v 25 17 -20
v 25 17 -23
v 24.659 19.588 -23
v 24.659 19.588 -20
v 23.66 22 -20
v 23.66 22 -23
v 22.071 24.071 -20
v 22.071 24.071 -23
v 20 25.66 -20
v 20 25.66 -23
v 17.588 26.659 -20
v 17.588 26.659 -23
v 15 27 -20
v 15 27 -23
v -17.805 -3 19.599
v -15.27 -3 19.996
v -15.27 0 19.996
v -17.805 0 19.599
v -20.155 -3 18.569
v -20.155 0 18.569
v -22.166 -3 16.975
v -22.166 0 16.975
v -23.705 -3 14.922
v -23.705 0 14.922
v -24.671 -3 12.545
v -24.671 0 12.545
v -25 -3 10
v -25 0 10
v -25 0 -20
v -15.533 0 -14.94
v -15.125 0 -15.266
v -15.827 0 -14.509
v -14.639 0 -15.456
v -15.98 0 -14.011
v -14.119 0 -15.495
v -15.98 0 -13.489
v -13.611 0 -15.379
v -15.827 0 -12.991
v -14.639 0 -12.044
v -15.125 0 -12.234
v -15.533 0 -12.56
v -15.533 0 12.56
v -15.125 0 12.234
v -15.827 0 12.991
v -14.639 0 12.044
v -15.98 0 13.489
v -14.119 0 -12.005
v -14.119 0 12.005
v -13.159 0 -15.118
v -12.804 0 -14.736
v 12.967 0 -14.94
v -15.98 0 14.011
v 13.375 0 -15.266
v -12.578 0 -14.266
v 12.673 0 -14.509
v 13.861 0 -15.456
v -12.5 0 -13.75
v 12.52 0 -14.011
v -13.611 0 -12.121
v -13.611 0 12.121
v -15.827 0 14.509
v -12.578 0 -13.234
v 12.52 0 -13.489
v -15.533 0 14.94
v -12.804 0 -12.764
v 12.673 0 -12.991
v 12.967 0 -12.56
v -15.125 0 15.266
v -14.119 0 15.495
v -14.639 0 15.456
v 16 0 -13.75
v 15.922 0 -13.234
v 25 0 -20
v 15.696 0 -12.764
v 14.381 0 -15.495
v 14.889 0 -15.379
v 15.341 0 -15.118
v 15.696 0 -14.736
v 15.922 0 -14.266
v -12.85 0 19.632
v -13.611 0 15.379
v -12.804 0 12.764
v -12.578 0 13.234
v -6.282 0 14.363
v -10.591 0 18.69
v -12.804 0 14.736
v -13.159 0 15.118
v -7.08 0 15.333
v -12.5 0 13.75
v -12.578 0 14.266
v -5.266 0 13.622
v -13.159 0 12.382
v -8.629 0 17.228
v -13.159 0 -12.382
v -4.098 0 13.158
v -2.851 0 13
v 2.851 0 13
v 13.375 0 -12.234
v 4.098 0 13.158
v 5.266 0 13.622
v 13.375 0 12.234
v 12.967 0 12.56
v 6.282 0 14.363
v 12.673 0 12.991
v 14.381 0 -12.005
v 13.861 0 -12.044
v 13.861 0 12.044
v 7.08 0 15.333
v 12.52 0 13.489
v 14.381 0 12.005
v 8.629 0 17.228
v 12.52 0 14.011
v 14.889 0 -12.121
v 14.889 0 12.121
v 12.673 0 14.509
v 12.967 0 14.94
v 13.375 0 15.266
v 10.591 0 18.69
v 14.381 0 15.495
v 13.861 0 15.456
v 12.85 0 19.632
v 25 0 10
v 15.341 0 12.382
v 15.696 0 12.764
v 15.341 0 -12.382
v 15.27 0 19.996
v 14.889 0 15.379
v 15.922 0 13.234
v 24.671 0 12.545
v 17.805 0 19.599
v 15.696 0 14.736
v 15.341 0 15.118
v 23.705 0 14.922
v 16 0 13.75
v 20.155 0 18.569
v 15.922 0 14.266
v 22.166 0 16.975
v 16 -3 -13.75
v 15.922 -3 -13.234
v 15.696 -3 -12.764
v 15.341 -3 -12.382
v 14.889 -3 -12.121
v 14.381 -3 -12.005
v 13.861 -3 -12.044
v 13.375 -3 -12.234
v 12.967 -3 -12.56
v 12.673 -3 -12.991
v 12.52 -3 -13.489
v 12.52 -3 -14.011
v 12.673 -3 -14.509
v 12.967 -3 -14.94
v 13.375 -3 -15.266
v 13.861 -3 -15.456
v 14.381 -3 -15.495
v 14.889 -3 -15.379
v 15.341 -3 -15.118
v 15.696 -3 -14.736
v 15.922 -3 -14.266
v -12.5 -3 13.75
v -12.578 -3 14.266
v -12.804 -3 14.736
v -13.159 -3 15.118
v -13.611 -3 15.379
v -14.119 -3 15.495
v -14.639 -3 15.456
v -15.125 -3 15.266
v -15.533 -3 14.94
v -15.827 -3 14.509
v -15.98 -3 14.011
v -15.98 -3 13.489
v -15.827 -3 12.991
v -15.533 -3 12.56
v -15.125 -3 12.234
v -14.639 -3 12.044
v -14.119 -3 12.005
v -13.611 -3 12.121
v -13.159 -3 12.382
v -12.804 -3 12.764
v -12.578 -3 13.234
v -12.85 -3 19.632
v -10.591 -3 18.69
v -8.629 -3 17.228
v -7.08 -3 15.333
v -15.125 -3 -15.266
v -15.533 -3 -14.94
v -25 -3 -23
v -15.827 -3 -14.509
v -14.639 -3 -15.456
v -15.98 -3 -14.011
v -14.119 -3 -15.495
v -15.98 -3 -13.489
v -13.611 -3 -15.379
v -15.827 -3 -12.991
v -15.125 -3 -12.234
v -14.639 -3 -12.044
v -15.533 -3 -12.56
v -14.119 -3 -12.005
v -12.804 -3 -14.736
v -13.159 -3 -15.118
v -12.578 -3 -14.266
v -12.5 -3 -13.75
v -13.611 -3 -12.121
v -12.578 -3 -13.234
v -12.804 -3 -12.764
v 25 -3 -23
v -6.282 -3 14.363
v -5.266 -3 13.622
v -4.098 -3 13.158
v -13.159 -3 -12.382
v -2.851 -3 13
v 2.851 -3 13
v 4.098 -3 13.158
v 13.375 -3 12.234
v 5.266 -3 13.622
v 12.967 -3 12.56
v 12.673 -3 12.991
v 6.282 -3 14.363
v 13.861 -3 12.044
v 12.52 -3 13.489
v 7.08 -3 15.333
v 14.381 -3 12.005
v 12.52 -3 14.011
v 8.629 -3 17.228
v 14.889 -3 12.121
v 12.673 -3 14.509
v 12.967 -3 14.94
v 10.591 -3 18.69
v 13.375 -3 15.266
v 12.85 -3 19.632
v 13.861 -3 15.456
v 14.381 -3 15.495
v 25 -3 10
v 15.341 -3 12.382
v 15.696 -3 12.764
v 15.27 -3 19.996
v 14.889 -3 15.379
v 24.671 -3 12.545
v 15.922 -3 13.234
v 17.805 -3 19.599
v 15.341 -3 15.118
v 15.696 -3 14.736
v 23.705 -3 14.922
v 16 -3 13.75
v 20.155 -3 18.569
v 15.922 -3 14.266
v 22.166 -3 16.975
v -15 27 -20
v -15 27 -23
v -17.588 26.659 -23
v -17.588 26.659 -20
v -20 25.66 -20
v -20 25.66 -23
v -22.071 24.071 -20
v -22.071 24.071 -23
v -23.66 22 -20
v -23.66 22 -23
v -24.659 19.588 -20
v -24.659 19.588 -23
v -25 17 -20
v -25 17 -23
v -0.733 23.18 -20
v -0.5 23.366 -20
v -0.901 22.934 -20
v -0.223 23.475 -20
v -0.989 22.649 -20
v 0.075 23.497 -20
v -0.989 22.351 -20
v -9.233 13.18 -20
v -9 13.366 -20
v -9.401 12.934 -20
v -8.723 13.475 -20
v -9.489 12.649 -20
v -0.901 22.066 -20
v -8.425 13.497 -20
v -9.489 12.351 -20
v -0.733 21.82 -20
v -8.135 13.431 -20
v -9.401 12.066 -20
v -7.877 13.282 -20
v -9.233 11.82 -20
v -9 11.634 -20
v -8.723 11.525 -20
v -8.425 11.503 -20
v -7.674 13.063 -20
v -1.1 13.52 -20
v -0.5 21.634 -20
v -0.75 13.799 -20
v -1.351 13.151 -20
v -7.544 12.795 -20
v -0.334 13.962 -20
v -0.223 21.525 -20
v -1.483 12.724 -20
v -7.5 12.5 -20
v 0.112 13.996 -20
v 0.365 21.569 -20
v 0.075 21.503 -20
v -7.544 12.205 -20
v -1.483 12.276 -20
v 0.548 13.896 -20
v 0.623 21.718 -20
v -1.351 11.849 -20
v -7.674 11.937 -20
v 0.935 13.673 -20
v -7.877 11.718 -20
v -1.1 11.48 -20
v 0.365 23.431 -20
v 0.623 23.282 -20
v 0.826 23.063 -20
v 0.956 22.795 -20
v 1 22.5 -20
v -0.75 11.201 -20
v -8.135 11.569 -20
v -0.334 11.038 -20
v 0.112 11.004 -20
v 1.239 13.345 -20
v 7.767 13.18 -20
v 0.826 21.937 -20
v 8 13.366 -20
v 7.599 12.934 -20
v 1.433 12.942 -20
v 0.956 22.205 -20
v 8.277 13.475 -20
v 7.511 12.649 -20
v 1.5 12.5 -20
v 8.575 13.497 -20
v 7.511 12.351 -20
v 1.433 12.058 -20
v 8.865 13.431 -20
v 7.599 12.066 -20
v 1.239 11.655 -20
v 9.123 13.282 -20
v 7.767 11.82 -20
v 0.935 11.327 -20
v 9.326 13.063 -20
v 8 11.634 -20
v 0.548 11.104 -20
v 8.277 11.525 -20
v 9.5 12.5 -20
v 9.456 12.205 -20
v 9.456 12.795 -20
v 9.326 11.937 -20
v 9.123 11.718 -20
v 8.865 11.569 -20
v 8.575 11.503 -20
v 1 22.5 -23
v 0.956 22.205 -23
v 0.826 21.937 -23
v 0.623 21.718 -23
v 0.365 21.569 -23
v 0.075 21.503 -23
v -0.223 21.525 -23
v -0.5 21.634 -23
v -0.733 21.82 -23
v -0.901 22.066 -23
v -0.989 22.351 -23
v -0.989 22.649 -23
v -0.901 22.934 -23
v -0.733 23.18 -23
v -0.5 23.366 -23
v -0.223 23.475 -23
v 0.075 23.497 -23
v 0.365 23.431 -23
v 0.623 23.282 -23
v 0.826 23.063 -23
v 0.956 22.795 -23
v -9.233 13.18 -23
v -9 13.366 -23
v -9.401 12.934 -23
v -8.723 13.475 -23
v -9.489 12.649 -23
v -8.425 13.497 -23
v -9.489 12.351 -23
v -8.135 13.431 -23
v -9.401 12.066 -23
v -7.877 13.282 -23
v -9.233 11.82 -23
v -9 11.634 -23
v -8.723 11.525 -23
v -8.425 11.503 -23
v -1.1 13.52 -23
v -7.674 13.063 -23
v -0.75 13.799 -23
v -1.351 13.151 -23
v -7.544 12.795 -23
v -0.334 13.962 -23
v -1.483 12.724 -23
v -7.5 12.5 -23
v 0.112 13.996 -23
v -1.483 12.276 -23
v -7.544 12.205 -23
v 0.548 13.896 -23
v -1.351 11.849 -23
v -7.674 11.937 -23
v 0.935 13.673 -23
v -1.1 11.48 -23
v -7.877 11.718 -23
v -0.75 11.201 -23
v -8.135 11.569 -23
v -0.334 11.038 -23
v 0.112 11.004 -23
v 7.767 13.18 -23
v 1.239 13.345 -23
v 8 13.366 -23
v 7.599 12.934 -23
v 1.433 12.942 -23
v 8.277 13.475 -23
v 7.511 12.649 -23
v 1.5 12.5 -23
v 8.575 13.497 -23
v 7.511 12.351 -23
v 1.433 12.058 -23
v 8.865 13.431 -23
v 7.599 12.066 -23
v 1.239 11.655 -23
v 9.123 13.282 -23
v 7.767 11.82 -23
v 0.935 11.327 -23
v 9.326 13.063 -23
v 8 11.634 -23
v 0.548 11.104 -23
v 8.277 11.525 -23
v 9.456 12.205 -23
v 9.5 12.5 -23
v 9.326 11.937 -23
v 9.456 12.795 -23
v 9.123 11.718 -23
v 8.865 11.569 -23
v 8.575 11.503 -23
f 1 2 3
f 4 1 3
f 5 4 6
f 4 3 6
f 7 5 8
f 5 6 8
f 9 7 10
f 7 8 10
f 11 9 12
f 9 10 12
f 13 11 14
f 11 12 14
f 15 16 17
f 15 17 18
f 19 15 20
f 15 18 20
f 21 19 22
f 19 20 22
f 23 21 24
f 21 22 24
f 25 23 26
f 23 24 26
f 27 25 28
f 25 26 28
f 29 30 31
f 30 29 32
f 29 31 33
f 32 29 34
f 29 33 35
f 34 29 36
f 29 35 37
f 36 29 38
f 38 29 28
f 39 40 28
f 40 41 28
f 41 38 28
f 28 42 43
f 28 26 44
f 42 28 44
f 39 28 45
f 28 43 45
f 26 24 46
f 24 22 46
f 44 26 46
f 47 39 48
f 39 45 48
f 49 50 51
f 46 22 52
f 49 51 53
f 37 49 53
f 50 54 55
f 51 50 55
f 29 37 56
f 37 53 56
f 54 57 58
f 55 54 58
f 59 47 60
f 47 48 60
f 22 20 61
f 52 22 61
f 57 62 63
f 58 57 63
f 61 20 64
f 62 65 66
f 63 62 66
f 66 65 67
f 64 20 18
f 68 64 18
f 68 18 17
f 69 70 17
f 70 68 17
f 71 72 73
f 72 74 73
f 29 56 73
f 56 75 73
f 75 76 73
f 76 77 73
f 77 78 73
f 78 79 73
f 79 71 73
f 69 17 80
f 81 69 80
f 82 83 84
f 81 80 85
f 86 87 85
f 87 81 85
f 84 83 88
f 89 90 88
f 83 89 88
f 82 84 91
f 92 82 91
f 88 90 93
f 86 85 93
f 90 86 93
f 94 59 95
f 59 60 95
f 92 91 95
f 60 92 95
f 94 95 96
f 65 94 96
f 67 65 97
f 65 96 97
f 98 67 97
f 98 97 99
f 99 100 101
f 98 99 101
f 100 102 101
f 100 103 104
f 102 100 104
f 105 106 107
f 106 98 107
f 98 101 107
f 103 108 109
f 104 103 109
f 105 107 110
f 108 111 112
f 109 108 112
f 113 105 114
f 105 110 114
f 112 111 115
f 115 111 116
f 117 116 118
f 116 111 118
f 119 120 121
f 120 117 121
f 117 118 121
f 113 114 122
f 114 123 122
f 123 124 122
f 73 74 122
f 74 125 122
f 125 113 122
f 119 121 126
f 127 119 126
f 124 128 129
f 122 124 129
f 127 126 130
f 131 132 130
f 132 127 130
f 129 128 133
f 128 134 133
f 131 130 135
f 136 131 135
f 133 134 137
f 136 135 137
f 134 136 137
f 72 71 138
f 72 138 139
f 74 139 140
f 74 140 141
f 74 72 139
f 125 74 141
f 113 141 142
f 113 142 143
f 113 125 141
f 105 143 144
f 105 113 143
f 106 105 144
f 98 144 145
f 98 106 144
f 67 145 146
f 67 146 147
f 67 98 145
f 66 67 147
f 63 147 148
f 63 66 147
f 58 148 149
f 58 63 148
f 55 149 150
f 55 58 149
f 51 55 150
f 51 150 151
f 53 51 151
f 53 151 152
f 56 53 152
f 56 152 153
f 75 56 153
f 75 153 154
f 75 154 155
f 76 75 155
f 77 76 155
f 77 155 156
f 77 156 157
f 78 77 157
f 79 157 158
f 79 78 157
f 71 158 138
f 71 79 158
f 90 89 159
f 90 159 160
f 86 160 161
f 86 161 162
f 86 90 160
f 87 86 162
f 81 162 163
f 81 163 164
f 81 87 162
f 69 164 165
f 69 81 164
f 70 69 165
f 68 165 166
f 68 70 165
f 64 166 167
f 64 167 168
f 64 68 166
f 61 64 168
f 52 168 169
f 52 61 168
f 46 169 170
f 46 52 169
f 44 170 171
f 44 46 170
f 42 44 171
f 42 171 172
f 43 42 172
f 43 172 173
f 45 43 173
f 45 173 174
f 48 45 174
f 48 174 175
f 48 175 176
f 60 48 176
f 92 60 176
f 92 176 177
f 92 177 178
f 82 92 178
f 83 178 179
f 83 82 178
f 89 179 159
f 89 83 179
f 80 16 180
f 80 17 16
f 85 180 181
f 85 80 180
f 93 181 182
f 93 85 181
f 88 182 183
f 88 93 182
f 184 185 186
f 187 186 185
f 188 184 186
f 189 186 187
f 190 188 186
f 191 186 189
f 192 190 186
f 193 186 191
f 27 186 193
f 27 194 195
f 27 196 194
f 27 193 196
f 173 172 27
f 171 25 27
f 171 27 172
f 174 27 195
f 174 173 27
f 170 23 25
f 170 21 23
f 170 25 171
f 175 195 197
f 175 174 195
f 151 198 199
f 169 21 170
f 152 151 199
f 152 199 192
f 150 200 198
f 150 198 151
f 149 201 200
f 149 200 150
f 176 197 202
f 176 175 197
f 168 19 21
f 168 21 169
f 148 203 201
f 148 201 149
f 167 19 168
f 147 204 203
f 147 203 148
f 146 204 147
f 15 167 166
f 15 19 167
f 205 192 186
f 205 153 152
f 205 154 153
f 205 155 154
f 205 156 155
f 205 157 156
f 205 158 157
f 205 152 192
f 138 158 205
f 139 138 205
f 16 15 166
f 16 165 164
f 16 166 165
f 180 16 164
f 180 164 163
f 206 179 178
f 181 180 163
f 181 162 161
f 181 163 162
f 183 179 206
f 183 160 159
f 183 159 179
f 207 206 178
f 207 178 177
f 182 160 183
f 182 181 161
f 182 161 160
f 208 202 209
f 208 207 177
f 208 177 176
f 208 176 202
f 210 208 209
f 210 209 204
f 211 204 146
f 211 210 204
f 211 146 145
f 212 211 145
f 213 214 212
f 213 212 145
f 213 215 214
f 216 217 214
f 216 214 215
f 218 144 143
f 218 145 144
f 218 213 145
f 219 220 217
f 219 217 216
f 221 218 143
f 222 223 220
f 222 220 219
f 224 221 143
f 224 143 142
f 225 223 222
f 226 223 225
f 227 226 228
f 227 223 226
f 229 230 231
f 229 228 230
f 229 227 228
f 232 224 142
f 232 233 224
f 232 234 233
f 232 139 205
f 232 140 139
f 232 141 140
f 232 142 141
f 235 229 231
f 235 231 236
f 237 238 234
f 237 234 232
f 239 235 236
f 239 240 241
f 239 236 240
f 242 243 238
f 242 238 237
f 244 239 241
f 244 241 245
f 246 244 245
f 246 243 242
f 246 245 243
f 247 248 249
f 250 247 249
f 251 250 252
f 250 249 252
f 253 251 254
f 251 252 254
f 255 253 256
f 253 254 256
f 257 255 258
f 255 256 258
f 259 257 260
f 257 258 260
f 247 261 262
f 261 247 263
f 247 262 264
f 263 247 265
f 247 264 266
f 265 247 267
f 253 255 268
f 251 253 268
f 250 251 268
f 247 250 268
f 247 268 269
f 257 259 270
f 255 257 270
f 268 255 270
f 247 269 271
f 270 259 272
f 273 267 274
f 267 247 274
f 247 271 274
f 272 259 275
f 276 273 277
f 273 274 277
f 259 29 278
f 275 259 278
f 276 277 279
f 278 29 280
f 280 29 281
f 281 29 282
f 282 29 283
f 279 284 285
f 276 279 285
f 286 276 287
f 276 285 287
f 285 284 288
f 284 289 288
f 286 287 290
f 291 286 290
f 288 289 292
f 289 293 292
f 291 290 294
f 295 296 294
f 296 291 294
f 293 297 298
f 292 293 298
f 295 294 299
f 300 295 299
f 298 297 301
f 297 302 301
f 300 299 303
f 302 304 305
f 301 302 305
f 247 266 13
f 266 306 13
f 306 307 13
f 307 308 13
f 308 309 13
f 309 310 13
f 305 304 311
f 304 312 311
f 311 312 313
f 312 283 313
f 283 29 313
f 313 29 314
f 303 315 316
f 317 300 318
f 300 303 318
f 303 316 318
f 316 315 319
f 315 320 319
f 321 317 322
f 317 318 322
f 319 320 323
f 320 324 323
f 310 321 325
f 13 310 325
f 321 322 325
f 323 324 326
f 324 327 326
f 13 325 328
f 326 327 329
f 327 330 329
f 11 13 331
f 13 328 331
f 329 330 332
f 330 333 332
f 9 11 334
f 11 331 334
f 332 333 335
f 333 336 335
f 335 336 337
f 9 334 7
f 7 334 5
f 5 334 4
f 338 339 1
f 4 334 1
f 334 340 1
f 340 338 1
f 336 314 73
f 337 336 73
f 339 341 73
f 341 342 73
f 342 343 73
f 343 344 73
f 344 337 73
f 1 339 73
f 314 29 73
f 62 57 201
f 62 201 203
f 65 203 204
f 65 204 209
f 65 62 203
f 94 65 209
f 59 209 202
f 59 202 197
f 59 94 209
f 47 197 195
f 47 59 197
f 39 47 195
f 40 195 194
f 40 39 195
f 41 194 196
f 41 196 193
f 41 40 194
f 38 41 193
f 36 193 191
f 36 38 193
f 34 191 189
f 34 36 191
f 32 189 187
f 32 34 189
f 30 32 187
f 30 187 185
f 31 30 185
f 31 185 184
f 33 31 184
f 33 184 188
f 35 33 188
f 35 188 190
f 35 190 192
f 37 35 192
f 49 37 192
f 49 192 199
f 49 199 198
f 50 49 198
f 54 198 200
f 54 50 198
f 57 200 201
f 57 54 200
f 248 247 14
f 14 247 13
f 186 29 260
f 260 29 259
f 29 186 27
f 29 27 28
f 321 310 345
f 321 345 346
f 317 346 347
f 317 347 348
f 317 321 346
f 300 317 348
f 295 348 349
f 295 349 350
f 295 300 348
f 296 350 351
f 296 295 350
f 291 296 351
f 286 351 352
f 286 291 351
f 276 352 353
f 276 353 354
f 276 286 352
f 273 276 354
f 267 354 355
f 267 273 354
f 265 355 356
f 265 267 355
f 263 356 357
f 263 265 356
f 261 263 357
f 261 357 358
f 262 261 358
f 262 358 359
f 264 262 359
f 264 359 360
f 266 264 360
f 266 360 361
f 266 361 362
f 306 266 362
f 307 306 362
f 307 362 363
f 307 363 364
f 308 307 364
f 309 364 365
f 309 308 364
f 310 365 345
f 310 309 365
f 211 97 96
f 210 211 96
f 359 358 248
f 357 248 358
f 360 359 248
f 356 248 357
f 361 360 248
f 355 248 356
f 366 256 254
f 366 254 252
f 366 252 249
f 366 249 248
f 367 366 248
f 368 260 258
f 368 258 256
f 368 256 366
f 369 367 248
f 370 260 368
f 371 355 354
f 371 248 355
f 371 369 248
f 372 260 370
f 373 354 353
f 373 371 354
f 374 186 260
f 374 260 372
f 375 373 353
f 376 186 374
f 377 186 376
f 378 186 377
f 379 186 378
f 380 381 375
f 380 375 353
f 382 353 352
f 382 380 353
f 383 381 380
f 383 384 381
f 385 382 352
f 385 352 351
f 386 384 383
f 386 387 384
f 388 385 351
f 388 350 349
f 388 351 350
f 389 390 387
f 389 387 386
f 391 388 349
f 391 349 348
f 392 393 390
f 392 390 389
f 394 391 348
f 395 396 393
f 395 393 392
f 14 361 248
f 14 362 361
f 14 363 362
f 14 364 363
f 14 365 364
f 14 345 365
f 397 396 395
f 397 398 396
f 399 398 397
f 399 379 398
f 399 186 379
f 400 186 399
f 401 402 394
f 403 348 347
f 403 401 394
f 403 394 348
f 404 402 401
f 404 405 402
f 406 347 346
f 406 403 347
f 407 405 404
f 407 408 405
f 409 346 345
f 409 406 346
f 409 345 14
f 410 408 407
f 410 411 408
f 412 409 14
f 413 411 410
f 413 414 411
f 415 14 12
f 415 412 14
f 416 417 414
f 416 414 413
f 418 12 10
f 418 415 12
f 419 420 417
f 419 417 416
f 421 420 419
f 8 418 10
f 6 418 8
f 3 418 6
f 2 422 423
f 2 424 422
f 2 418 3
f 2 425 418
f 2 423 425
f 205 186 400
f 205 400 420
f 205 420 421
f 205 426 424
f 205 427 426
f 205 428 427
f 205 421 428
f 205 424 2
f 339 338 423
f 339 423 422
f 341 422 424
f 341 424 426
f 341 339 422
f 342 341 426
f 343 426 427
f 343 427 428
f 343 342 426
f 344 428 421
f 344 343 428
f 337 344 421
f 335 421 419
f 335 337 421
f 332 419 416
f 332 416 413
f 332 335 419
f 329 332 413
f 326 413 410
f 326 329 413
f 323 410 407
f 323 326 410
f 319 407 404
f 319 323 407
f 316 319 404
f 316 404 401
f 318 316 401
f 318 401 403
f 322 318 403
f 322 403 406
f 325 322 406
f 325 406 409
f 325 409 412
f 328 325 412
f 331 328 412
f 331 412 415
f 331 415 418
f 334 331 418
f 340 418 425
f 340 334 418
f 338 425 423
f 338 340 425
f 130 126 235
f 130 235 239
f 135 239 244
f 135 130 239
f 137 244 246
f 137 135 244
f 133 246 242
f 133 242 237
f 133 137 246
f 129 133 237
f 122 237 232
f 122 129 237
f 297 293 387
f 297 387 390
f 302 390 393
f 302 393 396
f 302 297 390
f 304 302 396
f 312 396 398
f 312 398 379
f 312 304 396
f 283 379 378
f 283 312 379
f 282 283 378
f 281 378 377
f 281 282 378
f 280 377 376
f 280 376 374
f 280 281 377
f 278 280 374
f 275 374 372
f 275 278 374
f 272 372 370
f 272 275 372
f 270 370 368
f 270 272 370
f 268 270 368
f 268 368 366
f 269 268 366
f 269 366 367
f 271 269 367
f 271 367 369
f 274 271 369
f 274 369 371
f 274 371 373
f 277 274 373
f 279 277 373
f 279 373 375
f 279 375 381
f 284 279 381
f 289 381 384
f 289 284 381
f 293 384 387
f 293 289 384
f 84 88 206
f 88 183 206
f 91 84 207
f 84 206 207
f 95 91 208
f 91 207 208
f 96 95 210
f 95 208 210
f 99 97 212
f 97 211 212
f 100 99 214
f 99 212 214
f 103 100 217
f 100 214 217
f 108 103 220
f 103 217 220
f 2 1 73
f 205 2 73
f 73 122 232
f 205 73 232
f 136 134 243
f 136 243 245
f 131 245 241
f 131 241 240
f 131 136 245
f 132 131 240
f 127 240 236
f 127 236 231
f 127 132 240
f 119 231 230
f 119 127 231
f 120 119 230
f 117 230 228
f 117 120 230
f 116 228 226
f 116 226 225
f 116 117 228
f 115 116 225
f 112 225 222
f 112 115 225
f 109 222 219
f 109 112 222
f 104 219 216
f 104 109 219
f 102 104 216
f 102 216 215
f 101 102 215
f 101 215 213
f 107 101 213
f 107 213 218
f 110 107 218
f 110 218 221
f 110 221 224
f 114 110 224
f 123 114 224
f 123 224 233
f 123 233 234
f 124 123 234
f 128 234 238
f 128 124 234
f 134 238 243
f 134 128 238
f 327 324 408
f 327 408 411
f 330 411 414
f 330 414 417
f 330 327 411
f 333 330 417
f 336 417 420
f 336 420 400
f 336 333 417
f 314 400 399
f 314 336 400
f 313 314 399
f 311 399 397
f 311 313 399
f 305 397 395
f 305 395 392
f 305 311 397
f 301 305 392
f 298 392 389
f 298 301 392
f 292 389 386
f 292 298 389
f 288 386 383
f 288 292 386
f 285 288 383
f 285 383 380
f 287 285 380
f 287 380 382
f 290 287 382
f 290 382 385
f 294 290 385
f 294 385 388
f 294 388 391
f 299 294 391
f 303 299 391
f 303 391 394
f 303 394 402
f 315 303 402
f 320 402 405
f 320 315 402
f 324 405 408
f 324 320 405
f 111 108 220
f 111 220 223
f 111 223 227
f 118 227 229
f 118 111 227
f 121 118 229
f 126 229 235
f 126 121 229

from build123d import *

# Parameters (mm, degrees)
F0_R        = 1.75
F1_DEPTH    = 3
F2_W        = 50
F2_H        = 3
F2_H_2      = 27
F2_R        = 1
F2_R_2      = 1.5
F3_DEPTH    = 3
F4_T1_DEPTH = 53
F4_T3_DEPTH = 53
F4_T5_DEPTH = 50.6969600708
F5_R        = 5


# Not quite as in the source:
# - a fillet or chamfer that OpenCascade refuses, or shapes differently, is made with other operations: its cross-section is extruded or revolved along the edge and cut away or added


with BuildPart() as f1:
    # F0 (on Front) → F1 (new body)
    with BuildSketch(Plane.XZ):
        Polygon((-6, 20), (-25, 20), (-25, -20), (25, -20), (25, 20), (6, 20), (6, 13), (-6, 13), align=None)
        with Locations((-14.25, -13.75)):
            Circle(F0_R, mode=Mode.SUBTRACT)
        with Locations((14.25, -13.75)):
            Circle(F0_R, mode=Mode.SUBTRACT)
        with Locations((-14.25, 13.75)):
            Circle(F0_R, mode=Mode.SUBTRACT)
        with Locations((14.25, 13.75)):
            Circle(F0_R, mode=Mode.SUBTRACT)
    extrude(amount=F1_DEPTH)

    # F2 (on face) → F3 (join)
    with BuildSketch(Plane(origin=(0, 0, -20), x_dir=(1, 0, 0), z_dir=(0, 0, -1))):
        with Locations((0, 1.5)):
            Rectangle(F2_W, F2_H)
        with Locations((0, -13.5)):
            Rectangle(F2_W, F2_H_2)
        with Locations((-8.5, -12.5)):
            Circle(F2_R, mode=Mode.SUBTRACT)
        with Locations((0, -22.5)):
            Circle(F2_R, mode=Mode.SUBTRACT)
        with Locations((0, -12.5)):
            Circle(F2_R_2, mode=Mode.SUBTRACT)
        with Locations((8.5, -12.5)):
            Circle(F2_R, mode=Mode.SUBTRACT)
    extrude(amount=F3_DEPTH)

    # F4: fillet of radius 10 on 6 edges, made by hand

    # F4_s2 → F4_t1 (cut)
    with BuildSketch(Plane.XY.offset(-48)):
        with BuildLine():
            ThreePointArc((25, 17), (22.0710678119, 24.0710678119), (15, 27))
            Line((15, 27), (25, 27))
            Line((25, 27), (25, 17))
        make_face()
        with BuildLine():
            ThreePointArc((-15, 27), (-22.0710678119, 24.0710678119), (-25, 17))
            Line((-25, 17), (-25, 27))
            Line((-25, 27), (-15, 27))
        make_face()
    extrude(amount=F4_T1_DEPTH, mode=Mode.SUBTRACT)

    # F4_s4 → F4_t3 (cut)
    with BuildSketch(Plane.XZ.offset(-25)):
        with BuildLine():
            ThreePointArc((-15, 20), (-22.0710678119, 17.0710678119), (-25, 10))
            Line((-25, 10), (-25, 20))
            Line((-25, 20), (-15, 20))
        make_face()
        with BuildLine():
            ThreePointArc((15, 20), (22.0710678119, 17.0710678119), (25, 10))
            Line((25, 10), (25, 20))
            Line((25, 20), (15, 20))
        make_face()
    extrude(amount=F4_T3_DEPTH, mode=Mode.SUBTRACT)

    # F4_s6 → F4_t5 (cut)
    with BuildSketch(Plane.XZ.offset(-23.8484800354)):
        with BuildLine():
            ThreePointArc((6, 13), (9.6233122311, 18.0622577483), (15.5393920142, 20))
            Line((15.5393920142, 20), (6, 20))
            Line((6, 20), (6, 13))
        make_face()
        with BuildLine():
            ThreePointArc((-15.5393920142, 20), (-9.6233122311, 18.0622577483), (-6, 13))
            Line((-6, 13), (-6, 20))
            Line((-6, 20), (-15.5393920142, 20))
        make_face()
    extrude(amount=F4_T5_DEPTH, mode=Mode.SUBTRACT)

    # F5
    f5_edges = [f1.edges().sort_by_distance(p)[0] for p in [
        (6, -1.5, 13),
        (-6, -1.5, 13),
    ]]
    fillet(f5_edges, radius=F5_R)


solid = f1.part
